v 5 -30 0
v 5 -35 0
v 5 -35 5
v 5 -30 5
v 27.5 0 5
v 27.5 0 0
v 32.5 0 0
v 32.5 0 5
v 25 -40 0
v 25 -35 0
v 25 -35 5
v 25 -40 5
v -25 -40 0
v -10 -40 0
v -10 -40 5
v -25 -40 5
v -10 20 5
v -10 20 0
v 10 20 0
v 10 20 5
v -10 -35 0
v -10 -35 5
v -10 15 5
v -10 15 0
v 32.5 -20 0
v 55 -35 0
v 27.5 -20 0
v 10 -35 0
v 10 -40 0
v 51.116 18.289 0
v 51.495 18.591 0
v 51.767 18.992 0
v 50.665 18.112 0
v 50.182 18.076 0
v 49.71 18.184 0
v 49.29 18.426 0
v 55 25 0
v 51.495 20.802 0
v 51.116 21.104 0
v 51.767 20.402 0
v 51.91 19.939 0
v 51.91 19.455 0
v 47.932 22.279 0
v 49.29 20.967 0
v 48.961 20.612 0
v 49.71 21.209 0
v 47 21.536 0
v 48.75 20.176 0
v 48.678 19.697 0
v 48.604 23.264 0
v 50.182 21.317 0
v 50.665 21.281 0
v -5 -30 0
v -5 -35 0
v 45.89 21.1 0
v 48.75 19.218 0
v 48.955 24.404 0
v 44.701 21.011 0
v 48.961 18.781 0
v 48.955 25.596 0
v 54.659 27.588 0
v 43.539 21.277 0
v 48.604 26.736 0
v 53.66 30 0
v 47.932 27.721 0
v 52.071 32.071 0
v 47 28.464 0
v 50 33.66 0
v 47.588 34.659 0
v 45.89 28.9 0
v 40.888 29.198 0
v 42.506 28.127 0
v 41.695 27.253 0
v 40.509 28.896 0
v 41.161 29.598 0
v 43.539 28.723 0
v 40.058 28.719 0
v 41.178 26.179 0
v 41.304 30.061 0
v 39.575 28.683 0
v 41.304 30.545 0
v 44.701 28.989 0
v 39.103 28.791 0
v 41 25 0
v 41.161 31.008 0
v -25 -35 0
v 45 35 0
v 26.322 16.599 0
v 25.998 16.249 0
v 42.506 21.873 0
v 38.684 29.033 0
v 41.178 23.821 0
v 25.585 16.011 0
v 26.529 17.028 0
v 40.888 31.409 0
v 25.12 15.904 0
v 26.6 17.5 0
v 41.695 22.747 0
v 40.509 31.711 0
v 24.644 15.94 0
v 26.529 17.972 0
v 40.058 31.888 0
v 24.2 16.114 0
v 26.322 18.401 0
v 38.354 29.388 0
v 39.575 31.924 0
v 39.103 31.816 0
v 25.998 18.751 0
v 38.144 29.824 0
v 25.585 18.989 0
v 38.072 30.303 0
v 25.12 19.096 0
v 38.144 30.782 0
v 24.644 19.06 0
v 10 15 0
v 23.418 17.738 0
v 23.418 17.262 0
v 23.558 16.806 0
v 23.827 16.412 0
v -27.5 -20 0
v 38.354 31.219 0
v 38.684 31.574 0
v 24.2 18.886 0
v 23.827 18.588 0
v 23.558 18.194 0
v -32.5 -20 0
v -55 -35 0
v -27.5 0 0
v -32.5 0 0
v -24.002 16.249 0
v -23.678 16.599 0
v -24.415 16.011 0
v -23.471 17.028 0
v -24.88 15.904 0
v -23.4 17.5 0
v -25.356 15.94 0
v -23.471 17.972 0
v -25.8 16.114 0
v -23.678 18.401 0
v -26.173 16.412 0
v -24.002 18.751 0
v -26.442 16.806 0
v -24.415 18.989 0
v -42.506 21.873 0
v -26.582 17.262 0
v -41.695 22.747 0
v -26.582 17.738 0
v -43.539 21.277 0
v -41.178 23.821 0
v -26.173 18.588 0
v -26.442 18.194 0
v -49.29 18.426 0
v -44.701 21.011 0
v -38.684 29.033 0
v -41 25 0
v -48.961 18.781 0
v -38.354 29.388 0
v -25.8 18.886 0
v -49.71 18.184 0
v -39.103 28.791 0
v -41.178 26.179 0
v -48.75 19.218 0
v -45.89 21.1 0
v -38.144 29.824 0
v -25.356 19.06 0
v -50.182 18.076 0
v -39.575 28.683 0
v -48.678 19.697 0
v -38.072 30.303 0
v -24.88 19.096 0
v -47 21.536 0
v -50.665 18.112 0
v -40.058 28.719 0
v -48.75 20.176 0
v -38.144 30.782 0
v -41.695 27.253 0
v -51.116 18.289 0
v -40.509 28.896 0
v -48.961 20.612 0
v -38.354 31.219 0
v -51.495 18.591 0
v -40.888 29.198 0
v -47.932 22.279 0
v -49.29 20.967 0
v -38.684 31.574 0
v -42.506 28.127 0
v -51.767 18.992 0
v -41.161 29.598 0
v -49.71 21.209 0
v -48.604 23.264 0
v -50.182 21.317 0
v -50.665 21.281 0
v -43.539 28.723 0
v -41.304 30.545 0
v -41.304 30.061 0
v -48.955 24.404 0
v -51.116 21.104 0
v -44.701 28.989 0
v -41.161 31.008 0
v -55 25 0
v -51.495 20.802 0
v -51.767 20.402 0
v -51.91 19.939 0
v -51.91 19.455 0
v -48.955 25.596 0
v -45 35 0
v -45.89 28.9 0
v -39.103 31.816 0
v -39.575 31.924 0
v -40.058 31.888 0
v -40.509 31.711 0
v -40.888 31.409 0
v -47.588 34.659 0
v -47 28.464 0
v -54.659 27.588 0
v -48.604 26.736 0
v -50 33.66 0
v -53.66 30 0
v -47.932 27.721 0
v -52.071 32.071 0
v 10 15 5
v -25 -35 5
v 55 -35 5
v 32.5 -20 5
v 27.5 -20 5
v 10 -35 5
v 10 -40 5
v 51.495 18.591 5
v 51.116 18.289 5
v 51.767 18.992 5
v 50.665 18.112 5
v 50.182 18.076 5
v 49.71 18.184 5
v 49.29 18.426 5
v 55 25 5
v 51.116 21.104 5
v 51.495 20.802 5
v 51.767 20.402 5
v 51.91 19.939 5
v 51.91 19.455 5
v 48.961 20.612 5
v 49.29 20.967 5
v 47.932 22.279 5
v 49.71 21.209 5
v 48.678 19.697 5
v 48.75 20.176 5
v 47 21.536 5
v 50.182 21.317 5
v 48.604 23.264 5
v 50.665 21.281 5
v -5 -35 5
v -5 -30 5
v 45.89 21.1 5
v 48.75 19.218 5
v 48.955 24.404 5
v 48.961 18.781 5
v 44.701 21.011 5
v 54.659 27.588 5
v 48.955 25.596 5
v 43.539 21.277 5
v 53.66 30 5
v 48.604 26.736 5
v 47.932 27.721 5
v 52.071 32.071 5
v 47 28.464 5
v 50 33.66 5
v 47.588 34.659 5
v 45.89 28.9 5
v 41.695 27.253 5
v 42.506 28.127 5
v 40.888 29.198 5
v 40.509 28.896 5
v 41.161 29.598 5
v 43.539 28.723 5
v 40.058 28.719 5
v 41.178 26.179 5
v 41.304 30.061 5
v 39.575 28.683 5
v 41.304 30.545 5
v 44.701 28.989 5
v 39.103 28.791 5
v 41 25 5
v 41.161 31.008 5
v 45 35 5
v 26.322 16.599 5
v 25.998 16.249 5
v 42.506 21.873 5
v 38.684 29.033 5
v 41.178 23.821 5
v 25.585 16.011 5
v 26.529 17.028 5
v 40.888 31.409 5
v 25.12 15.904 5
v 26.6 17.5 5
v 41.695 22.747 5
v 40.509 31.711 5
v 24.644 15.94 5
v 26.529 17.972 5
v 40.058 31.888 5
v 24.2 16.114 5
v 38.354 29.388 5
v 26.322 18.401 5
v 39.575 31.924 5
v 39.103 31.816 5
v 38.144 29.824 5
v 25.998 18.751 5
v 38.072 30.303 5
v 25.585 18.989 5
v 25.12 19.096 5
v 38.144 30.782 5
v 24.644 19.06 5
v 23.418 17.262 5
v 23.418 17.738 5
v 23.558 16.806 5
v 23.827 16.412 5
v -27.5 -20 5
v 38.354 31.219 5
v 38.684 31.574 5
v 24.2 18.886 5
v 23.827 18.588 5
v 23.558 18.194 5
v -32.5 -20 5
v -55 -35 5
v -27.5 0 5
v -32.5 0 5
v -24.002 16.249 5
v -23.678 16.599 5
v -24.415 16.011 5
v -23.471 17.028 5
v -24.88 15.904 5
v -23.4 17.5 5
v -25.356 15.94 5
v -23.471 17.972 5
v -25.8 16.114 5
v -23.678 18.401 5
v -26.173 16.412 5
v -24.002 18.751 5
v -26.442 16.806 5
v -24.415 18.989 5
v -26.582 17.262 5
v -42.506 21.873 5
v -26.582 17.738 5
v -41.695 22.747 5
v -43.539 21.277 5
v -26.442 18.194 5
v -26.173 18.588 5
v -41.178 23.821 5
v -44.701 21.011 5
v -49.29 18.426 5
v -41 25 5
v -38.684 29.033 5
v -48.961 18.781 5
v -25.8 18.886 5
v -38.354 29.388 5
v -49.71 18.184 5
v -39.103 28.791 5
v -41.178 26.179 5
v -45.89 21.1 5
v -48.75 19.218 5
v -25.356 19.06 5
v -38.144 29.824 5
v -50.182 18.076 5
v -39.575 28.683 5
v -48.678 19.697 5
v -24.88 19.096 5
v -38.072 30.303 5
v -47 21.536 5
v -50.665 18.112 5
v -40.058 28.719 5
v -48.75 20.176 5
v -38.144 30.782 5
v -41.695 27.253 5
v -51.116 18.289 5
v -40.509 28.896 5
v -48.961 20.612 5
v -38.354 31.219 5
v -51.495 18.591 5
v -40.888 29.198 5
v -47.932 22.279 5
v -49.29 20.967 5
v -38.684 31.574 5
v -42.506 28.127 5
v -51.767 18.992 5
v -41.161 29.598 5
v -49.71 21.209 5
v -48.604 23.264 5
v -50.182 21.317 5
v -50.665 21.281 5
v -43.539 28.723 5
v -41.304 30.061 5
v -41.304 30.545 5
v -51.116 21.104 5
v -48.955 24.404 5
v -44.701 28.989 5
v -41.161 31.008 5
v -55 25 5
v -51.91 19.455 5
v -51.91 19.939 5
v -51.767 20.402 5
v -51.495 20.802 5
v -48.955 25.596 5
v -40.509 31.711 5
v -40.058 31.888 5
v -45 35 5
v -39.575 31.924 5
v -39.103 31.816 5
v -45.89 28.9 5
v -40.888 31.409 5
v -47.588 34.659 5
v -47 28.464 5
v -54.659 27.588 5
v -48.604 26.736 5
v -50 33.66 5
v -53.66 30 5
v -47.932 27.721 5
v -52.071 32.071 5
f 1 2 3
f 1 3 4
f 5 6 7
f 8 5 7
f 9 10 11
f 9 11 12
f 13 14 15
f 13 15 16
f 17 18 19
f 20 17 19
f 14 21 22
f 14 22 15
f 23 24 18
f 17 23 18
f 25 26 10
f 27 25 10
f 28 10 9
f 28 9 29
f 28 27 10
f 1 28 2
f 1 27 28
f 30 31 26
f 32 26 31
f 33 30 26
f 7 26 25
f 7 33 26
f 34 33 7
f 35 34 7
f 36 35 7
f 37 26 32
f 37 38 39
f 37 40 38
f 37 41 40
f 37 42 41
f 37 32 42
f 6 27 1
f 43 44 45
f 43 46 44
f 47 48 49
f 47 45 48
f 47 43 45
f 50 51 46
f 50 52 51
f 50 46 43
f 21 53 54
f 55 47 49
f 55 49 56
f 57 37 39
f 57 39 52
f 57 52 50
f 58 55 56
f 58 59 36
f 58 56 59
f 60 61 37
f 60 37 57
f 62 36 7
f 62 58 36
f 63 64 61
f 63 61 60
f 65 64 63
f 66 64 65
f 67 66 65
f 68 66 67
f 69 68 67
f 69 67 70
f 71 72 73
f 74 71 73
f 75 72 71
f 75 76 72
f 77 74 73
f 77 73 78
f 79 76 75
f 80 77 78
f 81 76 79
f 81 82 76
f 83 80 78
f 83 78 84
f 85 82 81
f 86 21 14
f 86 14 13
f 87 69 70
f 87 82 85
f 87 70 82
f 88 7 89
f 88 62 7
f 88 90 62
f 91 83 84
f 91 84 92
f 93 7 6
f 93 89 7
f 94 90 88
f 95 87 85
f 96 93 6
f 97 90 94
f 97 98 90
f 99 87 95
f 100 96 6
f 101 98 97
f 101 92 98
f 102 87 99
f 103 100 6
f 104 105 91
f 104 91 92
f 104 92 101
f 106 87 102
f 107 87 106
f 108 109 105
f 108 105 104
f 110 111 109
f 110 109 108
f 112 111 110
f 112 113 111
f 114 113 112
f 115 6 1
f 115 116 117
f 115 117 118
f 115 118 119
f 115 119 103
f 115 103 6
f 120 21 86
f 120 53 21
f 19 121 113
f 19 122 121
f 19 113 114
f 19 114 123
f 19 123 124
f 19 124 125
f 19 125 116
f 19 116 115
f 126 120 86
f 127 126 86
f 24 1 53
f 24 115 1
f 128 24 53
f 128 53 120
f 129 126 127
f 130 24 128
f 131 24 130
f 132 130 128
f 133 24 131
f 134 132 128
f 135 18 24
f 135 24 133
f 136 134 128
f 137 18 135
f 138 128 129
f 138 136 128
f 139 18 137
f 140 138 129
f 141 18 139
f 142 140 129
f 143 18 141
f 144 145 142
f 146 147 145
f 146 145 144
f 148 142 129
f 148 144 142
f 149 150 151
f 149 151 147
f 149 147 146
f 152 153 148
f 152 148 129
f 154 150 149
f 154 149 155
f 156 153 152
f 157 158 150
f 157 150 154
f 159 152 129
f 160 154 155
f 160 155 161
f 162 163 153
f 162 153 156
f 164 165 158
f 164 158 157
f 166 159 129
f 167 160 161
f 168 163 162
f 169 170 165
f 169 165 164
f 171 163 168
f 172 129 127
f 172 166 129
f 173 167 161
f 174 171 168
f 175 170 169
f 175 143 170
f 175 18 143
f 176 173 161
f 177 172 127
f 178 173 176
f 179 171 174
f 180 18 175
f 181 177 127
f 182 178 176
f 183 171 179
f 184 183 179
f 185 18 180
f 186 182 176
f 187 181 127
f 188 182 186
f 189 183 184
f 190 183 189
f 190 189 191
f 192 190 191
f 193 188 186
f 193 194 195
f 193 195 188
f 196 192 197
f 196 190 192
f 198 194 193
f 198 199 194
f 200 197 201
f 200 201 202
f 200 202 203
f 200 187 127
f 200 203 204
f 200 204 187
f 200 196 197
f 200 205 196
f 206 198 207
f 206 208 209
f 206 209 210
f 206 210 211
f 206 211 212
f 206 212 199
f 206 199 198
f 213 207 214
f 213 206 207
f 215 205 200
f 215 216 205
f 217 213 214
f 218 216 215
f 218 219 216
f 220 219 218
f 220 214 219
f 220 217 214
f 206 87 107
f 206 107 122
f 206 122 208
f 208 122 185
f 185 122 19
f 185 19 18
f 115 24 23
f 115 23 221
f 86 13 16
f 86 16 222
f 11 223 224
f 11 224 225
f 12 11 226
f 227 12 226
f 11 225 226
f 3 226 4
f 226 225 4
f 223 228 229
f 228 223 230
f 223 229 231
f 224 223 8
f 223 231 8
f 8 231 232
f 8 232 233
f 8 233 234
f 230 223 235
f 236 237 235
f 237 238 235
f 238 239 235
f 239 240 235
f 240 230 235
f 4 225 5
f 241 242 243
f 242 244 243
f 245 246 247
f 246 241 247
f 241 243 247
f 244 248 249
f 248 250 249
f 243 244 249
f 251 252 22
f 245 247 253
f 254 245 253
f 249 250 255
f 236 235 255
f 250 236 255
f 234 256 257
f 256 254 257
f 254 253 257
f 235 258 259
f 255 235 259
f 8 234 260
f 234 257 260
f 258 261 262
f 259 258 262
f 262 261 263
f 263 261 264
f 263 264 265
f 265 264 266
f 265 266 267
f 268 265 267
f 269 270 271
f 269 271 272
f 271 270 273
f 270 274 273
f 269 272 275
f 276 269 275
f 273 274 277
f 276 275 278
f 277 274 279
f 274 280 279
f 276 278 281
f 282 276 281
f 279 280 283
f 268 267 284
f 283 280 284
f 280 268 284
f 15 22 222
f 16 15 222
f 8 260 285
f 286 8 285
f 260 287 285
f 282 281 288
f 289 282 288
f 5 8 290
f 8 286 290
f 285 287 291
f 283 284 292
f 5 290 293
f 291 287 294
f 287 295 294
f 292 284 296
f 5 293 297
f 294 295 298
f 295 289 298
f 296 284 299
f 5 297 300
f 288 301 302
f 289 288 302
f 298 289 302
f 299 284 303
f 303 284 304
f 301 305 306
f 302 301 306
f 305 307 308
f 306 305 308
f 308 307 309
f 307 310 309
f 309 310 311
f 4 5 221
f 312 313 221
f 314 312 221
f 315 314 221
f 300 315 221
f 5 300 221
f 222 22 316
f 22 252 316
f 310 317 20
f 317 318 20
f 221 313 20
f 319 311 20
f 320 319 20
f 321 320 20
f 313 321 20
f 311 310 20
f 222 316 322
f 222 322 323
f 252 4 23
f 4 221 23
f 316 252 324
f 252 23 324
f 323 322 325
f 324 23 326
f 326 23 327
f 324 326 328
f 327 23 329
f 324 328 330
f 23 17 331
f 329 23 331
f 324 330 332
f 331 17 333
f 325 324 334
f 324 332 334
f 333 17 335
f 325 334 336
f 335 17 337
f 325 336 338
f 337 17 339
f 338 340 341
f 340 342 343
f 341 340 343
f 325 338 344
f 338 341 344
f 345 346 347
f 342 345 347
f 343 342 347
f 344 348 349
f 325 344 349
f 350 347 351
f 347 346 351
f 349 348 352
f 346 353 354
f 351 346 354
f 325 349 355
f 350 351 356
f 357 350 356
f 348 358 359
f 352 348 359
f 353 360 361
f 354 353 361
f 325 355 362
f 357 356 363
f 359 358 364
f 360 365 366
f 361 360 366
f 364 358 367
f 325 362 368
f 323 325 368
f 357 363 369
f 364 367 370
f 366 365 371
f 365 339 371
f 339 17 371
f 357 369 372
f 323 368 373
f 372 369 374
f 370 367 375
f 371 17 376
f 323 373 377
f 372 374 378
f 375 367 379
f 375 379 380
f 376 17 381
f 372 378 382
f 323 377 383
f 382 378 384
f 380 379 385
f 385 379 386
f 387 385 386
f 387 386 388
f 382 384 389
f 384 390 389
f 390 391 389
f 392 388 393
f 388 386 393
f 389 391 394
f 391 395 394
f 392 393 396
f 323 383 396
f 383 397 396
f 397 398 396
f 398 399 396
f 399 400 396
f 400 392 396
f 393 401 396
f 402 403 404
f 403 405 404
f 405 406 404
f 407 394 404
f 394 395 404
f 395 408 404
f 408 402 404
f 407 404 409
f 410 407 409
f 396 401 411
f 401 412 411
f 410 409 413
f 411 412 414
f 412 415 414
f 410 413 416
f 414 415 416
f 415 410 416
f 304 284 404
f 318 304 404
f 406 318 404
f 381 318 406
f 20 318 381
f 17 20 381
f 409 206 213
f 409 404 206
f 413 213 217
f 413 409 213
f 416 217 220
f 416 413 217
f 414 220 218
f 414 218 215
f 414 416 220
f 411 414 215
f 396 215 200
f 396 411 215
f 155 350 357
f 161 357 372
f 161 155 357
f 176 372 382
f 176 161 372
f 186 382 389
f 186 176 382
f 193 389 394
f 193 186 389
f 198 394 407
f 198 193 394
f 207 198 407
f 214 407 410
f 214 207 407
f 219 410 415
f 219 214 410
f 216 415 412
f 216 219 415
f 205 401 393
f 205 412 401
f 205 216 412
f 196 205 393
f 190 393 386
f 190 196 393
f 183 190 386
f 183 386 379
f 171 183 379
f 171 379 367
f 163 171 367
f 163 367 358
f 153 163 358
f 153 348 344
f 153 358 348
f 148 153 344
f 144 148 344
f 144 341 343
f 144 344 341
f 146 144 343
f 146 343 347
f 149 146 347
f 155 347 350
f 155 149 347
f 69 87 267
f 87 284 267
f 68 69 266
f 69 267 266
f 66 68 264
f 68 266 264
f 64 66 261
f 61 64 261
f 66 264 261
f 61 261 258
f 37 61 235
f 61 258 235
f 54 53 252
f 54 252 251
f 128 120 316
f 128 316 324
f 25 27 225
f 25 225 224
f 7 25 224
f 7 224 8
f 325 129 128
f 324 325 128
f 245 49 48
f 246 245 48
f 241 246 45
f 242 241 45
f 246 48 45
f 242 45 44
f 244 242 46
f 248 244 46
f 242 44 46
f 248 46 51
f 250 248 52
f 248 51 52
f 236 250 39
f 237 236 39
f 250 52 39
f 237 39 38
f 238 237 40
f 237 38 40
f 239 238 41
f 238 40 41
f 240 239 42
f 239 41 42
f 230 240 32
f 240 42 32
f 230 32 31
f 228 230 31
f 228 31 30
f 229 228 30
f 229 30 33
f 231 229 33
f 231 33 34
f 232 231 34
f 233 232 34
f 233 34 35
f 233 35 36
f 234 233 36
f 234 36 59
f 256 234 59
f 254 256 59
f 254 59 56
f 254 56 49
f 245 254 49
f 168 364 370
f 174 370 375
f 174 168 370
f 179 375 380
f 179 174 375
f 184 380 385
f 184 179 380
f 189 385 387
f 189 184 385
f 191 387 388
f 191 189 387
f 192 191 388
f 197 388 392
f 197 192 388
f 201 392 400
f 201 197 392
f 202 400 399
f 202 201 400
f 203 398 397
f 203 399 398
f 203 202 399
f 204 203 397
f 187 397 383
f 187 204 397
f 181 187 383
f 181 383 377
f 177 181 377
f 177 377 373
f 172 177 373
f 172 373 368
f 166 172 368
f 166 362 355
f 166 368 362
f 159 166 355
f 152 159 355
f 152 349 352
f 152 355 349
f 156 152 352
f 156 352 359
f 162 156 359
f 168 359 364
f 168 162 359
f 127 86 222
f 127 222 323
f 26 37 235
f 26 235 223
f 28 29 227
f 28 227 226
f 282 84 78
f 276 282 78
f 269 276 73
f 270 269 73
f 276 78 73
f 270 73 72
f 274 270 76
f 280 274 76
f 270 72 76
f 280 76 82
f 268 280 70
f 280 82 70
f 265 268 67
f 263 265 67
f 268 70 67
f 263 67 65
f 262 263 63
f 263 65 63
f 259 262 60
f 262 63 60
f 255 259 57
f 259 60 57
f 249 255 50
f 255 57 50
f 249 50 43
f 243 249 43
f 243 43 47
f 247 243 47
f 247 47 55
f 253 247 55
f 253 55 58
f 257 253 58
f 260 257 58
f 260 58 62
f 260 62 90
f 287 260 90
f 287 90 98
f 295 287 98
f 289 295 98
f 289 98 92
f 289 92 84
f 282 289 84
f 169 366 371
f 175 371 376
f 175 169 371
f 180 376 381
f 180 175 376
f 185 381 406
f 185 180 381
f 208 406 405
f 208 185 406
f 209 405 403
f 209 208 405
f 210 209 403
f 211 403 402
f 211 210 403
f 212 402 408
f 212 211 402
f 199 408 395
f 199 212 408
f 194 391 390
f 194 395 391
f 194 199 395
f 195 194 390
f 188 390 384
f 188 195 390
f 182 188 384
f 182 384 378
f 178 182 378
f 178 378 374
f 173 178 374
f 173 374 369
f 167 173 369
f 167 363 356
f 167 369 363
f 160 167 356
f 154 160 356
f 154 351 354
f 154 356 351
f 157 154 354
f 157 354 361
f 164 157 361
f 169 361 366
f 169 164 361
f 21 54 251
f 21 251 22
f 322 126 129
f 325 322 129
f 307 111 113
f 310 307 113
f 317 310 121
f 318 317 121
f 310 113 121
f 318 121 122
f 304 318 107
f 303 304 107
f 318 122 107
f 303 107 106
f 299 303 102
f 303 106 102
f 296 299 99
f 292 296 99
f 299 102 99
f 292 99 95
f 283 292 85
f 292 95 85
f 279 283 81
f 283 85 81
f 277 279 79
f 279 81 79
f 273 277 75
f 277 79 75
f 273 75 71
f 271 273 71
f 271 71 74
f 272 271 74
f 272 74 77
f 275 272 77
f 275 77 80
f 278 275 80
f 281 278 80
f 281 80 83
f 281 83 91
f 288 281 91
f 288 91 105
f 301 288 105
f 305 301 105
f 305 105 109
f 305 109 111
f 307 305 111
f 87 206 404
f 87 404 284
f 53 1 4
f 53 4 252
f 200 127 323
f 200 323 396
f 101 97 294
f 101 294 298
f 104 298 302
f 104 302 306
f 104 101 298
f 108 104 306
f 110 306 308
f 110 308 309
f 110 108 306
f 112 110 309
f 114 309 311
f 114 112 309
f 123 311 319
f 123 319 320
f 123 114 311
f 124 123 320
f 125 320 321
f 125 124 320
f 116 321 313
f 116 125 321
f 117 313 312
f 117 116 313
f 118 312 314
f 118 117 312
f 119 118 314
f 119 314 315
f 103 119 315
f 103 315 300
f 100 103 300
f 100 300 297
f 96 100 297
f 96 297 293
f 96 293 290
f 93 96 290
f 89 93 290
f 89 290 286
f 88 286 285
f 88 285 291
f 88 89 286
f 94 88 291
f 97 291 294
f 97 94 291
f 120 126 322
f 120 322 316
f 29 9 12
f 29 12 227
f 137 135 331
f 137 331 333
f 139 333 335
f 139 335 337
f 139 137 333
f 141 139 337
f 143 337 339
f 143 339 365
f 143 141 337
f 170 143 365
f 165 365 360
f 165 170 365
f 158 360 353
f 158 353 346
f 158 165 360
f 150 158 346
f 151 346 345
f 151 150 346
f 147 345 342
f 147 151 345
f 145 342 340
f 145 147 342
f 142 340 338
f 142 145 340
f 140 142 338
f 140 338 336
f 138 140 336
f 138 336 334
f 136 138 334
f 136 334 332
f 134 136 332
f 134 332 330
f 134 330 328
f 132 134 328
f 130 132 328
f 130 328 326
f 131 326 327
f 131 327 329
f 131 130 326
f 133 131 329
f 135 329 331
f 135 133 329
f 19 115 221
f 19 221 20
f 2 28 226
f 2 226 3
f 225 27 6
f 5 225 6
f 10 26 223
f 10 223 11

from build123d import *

# Parameters (mm, degrees)
ESQUISSE1_R             = 1.6
ESQUISSE1_W             = 5
ESQUISSE1_H             = 20
ESQUISSE1_W_2           = 20
ESQUISSE1_H_2           = 5
BOSS_EXTRU_1_DEPTH      = 5
CONG_1_R                = 10
ESQUISSE2_R             = 4
ESQUISSE2_R_2           = 1.625
ENL_V_MAT_EXTRU_1_DEPTH = 10


with BuildPart() as part:
    # Esquisse1 → Boss.-Extru.1 (new body)
    with BuildSketch(Plane.XY):
        Polygon((-55, 35), (55, 35), (55, -35), (25, -35), (25, -40), (10, -40), (10, -35), (5, -35), (5, -30), (-5, -30), (-5, -35), (-10, -35), (-10, -40), (-25, -40), (-25, -35), (-55, -35), align=None)
        with Locations((-25, 17.5)):
            Circle(ESQUISSE1_R, mode=Mode.SUBTRACT)
        with Locations((25, 17.5)):
            Circle(ESQUISSE1_R, mode=Mode.SUBTRACT)
        with Locations((-30, -10)):
            Rectangle(ESQUISSE1_W, ESQUISSE1_H, mode=Mode.SUBTRACT)
        with Locations((30, -10)):
            Rectangle(ESQUISSE1_W, ESQUISSE1_H, mode=Mode.SUBTRACT)
        with Locations((0, 17.5)):
            Rectangle(ESQUISSE1_W_2, ESQUISSE1_H_2, mode=Mode.SUBTRACT)
    extrude(amount=BOSS_EXTRU_1_DEPTH)

    # Congé1
    cong_1_edges = [part.edges().sort_by_distance(p)[0] for p in [
        (-55, 35, 2.5),
        (55, 35, 2.5),
    ]]
    fillet(cong_1_edges, radius=CONG_1_R)

    # Esquisse2 → Enlèv. mat.-Extru.1 (cut)
    with BuildSketch(Plane(origin=(0, 0, 0), x_dir=(-1, 0, 0), z_dir=(0, 0, -1))):
        with Locations((-45, 25)):
            Circle(ESQUISSE2_R)
        with Locations((-50.303300859, 19.696699141)):
            Circle(ESQUISSE2_R_2)
        with Locations((-39.696699141, 30.303300859)):
            Circle(ESQUISSE2_R_2)
    enl_v_mat_extru_1 = extrude(amount=-ENL_V_MAT_EXTRU_1_DEPTH, mode=Mode.SUBTRACT)

    # Symétrie1: Enlèv. mat.-Extru.1 across plane
    add(enl_v_mat_extru_1.mirror(Plane(origin=(0, 0, 0), x_dir=(0, 0, 1), z_dir=(1, 0, 0))), mode=Mode.SUBTRACT)


solid = part.part
